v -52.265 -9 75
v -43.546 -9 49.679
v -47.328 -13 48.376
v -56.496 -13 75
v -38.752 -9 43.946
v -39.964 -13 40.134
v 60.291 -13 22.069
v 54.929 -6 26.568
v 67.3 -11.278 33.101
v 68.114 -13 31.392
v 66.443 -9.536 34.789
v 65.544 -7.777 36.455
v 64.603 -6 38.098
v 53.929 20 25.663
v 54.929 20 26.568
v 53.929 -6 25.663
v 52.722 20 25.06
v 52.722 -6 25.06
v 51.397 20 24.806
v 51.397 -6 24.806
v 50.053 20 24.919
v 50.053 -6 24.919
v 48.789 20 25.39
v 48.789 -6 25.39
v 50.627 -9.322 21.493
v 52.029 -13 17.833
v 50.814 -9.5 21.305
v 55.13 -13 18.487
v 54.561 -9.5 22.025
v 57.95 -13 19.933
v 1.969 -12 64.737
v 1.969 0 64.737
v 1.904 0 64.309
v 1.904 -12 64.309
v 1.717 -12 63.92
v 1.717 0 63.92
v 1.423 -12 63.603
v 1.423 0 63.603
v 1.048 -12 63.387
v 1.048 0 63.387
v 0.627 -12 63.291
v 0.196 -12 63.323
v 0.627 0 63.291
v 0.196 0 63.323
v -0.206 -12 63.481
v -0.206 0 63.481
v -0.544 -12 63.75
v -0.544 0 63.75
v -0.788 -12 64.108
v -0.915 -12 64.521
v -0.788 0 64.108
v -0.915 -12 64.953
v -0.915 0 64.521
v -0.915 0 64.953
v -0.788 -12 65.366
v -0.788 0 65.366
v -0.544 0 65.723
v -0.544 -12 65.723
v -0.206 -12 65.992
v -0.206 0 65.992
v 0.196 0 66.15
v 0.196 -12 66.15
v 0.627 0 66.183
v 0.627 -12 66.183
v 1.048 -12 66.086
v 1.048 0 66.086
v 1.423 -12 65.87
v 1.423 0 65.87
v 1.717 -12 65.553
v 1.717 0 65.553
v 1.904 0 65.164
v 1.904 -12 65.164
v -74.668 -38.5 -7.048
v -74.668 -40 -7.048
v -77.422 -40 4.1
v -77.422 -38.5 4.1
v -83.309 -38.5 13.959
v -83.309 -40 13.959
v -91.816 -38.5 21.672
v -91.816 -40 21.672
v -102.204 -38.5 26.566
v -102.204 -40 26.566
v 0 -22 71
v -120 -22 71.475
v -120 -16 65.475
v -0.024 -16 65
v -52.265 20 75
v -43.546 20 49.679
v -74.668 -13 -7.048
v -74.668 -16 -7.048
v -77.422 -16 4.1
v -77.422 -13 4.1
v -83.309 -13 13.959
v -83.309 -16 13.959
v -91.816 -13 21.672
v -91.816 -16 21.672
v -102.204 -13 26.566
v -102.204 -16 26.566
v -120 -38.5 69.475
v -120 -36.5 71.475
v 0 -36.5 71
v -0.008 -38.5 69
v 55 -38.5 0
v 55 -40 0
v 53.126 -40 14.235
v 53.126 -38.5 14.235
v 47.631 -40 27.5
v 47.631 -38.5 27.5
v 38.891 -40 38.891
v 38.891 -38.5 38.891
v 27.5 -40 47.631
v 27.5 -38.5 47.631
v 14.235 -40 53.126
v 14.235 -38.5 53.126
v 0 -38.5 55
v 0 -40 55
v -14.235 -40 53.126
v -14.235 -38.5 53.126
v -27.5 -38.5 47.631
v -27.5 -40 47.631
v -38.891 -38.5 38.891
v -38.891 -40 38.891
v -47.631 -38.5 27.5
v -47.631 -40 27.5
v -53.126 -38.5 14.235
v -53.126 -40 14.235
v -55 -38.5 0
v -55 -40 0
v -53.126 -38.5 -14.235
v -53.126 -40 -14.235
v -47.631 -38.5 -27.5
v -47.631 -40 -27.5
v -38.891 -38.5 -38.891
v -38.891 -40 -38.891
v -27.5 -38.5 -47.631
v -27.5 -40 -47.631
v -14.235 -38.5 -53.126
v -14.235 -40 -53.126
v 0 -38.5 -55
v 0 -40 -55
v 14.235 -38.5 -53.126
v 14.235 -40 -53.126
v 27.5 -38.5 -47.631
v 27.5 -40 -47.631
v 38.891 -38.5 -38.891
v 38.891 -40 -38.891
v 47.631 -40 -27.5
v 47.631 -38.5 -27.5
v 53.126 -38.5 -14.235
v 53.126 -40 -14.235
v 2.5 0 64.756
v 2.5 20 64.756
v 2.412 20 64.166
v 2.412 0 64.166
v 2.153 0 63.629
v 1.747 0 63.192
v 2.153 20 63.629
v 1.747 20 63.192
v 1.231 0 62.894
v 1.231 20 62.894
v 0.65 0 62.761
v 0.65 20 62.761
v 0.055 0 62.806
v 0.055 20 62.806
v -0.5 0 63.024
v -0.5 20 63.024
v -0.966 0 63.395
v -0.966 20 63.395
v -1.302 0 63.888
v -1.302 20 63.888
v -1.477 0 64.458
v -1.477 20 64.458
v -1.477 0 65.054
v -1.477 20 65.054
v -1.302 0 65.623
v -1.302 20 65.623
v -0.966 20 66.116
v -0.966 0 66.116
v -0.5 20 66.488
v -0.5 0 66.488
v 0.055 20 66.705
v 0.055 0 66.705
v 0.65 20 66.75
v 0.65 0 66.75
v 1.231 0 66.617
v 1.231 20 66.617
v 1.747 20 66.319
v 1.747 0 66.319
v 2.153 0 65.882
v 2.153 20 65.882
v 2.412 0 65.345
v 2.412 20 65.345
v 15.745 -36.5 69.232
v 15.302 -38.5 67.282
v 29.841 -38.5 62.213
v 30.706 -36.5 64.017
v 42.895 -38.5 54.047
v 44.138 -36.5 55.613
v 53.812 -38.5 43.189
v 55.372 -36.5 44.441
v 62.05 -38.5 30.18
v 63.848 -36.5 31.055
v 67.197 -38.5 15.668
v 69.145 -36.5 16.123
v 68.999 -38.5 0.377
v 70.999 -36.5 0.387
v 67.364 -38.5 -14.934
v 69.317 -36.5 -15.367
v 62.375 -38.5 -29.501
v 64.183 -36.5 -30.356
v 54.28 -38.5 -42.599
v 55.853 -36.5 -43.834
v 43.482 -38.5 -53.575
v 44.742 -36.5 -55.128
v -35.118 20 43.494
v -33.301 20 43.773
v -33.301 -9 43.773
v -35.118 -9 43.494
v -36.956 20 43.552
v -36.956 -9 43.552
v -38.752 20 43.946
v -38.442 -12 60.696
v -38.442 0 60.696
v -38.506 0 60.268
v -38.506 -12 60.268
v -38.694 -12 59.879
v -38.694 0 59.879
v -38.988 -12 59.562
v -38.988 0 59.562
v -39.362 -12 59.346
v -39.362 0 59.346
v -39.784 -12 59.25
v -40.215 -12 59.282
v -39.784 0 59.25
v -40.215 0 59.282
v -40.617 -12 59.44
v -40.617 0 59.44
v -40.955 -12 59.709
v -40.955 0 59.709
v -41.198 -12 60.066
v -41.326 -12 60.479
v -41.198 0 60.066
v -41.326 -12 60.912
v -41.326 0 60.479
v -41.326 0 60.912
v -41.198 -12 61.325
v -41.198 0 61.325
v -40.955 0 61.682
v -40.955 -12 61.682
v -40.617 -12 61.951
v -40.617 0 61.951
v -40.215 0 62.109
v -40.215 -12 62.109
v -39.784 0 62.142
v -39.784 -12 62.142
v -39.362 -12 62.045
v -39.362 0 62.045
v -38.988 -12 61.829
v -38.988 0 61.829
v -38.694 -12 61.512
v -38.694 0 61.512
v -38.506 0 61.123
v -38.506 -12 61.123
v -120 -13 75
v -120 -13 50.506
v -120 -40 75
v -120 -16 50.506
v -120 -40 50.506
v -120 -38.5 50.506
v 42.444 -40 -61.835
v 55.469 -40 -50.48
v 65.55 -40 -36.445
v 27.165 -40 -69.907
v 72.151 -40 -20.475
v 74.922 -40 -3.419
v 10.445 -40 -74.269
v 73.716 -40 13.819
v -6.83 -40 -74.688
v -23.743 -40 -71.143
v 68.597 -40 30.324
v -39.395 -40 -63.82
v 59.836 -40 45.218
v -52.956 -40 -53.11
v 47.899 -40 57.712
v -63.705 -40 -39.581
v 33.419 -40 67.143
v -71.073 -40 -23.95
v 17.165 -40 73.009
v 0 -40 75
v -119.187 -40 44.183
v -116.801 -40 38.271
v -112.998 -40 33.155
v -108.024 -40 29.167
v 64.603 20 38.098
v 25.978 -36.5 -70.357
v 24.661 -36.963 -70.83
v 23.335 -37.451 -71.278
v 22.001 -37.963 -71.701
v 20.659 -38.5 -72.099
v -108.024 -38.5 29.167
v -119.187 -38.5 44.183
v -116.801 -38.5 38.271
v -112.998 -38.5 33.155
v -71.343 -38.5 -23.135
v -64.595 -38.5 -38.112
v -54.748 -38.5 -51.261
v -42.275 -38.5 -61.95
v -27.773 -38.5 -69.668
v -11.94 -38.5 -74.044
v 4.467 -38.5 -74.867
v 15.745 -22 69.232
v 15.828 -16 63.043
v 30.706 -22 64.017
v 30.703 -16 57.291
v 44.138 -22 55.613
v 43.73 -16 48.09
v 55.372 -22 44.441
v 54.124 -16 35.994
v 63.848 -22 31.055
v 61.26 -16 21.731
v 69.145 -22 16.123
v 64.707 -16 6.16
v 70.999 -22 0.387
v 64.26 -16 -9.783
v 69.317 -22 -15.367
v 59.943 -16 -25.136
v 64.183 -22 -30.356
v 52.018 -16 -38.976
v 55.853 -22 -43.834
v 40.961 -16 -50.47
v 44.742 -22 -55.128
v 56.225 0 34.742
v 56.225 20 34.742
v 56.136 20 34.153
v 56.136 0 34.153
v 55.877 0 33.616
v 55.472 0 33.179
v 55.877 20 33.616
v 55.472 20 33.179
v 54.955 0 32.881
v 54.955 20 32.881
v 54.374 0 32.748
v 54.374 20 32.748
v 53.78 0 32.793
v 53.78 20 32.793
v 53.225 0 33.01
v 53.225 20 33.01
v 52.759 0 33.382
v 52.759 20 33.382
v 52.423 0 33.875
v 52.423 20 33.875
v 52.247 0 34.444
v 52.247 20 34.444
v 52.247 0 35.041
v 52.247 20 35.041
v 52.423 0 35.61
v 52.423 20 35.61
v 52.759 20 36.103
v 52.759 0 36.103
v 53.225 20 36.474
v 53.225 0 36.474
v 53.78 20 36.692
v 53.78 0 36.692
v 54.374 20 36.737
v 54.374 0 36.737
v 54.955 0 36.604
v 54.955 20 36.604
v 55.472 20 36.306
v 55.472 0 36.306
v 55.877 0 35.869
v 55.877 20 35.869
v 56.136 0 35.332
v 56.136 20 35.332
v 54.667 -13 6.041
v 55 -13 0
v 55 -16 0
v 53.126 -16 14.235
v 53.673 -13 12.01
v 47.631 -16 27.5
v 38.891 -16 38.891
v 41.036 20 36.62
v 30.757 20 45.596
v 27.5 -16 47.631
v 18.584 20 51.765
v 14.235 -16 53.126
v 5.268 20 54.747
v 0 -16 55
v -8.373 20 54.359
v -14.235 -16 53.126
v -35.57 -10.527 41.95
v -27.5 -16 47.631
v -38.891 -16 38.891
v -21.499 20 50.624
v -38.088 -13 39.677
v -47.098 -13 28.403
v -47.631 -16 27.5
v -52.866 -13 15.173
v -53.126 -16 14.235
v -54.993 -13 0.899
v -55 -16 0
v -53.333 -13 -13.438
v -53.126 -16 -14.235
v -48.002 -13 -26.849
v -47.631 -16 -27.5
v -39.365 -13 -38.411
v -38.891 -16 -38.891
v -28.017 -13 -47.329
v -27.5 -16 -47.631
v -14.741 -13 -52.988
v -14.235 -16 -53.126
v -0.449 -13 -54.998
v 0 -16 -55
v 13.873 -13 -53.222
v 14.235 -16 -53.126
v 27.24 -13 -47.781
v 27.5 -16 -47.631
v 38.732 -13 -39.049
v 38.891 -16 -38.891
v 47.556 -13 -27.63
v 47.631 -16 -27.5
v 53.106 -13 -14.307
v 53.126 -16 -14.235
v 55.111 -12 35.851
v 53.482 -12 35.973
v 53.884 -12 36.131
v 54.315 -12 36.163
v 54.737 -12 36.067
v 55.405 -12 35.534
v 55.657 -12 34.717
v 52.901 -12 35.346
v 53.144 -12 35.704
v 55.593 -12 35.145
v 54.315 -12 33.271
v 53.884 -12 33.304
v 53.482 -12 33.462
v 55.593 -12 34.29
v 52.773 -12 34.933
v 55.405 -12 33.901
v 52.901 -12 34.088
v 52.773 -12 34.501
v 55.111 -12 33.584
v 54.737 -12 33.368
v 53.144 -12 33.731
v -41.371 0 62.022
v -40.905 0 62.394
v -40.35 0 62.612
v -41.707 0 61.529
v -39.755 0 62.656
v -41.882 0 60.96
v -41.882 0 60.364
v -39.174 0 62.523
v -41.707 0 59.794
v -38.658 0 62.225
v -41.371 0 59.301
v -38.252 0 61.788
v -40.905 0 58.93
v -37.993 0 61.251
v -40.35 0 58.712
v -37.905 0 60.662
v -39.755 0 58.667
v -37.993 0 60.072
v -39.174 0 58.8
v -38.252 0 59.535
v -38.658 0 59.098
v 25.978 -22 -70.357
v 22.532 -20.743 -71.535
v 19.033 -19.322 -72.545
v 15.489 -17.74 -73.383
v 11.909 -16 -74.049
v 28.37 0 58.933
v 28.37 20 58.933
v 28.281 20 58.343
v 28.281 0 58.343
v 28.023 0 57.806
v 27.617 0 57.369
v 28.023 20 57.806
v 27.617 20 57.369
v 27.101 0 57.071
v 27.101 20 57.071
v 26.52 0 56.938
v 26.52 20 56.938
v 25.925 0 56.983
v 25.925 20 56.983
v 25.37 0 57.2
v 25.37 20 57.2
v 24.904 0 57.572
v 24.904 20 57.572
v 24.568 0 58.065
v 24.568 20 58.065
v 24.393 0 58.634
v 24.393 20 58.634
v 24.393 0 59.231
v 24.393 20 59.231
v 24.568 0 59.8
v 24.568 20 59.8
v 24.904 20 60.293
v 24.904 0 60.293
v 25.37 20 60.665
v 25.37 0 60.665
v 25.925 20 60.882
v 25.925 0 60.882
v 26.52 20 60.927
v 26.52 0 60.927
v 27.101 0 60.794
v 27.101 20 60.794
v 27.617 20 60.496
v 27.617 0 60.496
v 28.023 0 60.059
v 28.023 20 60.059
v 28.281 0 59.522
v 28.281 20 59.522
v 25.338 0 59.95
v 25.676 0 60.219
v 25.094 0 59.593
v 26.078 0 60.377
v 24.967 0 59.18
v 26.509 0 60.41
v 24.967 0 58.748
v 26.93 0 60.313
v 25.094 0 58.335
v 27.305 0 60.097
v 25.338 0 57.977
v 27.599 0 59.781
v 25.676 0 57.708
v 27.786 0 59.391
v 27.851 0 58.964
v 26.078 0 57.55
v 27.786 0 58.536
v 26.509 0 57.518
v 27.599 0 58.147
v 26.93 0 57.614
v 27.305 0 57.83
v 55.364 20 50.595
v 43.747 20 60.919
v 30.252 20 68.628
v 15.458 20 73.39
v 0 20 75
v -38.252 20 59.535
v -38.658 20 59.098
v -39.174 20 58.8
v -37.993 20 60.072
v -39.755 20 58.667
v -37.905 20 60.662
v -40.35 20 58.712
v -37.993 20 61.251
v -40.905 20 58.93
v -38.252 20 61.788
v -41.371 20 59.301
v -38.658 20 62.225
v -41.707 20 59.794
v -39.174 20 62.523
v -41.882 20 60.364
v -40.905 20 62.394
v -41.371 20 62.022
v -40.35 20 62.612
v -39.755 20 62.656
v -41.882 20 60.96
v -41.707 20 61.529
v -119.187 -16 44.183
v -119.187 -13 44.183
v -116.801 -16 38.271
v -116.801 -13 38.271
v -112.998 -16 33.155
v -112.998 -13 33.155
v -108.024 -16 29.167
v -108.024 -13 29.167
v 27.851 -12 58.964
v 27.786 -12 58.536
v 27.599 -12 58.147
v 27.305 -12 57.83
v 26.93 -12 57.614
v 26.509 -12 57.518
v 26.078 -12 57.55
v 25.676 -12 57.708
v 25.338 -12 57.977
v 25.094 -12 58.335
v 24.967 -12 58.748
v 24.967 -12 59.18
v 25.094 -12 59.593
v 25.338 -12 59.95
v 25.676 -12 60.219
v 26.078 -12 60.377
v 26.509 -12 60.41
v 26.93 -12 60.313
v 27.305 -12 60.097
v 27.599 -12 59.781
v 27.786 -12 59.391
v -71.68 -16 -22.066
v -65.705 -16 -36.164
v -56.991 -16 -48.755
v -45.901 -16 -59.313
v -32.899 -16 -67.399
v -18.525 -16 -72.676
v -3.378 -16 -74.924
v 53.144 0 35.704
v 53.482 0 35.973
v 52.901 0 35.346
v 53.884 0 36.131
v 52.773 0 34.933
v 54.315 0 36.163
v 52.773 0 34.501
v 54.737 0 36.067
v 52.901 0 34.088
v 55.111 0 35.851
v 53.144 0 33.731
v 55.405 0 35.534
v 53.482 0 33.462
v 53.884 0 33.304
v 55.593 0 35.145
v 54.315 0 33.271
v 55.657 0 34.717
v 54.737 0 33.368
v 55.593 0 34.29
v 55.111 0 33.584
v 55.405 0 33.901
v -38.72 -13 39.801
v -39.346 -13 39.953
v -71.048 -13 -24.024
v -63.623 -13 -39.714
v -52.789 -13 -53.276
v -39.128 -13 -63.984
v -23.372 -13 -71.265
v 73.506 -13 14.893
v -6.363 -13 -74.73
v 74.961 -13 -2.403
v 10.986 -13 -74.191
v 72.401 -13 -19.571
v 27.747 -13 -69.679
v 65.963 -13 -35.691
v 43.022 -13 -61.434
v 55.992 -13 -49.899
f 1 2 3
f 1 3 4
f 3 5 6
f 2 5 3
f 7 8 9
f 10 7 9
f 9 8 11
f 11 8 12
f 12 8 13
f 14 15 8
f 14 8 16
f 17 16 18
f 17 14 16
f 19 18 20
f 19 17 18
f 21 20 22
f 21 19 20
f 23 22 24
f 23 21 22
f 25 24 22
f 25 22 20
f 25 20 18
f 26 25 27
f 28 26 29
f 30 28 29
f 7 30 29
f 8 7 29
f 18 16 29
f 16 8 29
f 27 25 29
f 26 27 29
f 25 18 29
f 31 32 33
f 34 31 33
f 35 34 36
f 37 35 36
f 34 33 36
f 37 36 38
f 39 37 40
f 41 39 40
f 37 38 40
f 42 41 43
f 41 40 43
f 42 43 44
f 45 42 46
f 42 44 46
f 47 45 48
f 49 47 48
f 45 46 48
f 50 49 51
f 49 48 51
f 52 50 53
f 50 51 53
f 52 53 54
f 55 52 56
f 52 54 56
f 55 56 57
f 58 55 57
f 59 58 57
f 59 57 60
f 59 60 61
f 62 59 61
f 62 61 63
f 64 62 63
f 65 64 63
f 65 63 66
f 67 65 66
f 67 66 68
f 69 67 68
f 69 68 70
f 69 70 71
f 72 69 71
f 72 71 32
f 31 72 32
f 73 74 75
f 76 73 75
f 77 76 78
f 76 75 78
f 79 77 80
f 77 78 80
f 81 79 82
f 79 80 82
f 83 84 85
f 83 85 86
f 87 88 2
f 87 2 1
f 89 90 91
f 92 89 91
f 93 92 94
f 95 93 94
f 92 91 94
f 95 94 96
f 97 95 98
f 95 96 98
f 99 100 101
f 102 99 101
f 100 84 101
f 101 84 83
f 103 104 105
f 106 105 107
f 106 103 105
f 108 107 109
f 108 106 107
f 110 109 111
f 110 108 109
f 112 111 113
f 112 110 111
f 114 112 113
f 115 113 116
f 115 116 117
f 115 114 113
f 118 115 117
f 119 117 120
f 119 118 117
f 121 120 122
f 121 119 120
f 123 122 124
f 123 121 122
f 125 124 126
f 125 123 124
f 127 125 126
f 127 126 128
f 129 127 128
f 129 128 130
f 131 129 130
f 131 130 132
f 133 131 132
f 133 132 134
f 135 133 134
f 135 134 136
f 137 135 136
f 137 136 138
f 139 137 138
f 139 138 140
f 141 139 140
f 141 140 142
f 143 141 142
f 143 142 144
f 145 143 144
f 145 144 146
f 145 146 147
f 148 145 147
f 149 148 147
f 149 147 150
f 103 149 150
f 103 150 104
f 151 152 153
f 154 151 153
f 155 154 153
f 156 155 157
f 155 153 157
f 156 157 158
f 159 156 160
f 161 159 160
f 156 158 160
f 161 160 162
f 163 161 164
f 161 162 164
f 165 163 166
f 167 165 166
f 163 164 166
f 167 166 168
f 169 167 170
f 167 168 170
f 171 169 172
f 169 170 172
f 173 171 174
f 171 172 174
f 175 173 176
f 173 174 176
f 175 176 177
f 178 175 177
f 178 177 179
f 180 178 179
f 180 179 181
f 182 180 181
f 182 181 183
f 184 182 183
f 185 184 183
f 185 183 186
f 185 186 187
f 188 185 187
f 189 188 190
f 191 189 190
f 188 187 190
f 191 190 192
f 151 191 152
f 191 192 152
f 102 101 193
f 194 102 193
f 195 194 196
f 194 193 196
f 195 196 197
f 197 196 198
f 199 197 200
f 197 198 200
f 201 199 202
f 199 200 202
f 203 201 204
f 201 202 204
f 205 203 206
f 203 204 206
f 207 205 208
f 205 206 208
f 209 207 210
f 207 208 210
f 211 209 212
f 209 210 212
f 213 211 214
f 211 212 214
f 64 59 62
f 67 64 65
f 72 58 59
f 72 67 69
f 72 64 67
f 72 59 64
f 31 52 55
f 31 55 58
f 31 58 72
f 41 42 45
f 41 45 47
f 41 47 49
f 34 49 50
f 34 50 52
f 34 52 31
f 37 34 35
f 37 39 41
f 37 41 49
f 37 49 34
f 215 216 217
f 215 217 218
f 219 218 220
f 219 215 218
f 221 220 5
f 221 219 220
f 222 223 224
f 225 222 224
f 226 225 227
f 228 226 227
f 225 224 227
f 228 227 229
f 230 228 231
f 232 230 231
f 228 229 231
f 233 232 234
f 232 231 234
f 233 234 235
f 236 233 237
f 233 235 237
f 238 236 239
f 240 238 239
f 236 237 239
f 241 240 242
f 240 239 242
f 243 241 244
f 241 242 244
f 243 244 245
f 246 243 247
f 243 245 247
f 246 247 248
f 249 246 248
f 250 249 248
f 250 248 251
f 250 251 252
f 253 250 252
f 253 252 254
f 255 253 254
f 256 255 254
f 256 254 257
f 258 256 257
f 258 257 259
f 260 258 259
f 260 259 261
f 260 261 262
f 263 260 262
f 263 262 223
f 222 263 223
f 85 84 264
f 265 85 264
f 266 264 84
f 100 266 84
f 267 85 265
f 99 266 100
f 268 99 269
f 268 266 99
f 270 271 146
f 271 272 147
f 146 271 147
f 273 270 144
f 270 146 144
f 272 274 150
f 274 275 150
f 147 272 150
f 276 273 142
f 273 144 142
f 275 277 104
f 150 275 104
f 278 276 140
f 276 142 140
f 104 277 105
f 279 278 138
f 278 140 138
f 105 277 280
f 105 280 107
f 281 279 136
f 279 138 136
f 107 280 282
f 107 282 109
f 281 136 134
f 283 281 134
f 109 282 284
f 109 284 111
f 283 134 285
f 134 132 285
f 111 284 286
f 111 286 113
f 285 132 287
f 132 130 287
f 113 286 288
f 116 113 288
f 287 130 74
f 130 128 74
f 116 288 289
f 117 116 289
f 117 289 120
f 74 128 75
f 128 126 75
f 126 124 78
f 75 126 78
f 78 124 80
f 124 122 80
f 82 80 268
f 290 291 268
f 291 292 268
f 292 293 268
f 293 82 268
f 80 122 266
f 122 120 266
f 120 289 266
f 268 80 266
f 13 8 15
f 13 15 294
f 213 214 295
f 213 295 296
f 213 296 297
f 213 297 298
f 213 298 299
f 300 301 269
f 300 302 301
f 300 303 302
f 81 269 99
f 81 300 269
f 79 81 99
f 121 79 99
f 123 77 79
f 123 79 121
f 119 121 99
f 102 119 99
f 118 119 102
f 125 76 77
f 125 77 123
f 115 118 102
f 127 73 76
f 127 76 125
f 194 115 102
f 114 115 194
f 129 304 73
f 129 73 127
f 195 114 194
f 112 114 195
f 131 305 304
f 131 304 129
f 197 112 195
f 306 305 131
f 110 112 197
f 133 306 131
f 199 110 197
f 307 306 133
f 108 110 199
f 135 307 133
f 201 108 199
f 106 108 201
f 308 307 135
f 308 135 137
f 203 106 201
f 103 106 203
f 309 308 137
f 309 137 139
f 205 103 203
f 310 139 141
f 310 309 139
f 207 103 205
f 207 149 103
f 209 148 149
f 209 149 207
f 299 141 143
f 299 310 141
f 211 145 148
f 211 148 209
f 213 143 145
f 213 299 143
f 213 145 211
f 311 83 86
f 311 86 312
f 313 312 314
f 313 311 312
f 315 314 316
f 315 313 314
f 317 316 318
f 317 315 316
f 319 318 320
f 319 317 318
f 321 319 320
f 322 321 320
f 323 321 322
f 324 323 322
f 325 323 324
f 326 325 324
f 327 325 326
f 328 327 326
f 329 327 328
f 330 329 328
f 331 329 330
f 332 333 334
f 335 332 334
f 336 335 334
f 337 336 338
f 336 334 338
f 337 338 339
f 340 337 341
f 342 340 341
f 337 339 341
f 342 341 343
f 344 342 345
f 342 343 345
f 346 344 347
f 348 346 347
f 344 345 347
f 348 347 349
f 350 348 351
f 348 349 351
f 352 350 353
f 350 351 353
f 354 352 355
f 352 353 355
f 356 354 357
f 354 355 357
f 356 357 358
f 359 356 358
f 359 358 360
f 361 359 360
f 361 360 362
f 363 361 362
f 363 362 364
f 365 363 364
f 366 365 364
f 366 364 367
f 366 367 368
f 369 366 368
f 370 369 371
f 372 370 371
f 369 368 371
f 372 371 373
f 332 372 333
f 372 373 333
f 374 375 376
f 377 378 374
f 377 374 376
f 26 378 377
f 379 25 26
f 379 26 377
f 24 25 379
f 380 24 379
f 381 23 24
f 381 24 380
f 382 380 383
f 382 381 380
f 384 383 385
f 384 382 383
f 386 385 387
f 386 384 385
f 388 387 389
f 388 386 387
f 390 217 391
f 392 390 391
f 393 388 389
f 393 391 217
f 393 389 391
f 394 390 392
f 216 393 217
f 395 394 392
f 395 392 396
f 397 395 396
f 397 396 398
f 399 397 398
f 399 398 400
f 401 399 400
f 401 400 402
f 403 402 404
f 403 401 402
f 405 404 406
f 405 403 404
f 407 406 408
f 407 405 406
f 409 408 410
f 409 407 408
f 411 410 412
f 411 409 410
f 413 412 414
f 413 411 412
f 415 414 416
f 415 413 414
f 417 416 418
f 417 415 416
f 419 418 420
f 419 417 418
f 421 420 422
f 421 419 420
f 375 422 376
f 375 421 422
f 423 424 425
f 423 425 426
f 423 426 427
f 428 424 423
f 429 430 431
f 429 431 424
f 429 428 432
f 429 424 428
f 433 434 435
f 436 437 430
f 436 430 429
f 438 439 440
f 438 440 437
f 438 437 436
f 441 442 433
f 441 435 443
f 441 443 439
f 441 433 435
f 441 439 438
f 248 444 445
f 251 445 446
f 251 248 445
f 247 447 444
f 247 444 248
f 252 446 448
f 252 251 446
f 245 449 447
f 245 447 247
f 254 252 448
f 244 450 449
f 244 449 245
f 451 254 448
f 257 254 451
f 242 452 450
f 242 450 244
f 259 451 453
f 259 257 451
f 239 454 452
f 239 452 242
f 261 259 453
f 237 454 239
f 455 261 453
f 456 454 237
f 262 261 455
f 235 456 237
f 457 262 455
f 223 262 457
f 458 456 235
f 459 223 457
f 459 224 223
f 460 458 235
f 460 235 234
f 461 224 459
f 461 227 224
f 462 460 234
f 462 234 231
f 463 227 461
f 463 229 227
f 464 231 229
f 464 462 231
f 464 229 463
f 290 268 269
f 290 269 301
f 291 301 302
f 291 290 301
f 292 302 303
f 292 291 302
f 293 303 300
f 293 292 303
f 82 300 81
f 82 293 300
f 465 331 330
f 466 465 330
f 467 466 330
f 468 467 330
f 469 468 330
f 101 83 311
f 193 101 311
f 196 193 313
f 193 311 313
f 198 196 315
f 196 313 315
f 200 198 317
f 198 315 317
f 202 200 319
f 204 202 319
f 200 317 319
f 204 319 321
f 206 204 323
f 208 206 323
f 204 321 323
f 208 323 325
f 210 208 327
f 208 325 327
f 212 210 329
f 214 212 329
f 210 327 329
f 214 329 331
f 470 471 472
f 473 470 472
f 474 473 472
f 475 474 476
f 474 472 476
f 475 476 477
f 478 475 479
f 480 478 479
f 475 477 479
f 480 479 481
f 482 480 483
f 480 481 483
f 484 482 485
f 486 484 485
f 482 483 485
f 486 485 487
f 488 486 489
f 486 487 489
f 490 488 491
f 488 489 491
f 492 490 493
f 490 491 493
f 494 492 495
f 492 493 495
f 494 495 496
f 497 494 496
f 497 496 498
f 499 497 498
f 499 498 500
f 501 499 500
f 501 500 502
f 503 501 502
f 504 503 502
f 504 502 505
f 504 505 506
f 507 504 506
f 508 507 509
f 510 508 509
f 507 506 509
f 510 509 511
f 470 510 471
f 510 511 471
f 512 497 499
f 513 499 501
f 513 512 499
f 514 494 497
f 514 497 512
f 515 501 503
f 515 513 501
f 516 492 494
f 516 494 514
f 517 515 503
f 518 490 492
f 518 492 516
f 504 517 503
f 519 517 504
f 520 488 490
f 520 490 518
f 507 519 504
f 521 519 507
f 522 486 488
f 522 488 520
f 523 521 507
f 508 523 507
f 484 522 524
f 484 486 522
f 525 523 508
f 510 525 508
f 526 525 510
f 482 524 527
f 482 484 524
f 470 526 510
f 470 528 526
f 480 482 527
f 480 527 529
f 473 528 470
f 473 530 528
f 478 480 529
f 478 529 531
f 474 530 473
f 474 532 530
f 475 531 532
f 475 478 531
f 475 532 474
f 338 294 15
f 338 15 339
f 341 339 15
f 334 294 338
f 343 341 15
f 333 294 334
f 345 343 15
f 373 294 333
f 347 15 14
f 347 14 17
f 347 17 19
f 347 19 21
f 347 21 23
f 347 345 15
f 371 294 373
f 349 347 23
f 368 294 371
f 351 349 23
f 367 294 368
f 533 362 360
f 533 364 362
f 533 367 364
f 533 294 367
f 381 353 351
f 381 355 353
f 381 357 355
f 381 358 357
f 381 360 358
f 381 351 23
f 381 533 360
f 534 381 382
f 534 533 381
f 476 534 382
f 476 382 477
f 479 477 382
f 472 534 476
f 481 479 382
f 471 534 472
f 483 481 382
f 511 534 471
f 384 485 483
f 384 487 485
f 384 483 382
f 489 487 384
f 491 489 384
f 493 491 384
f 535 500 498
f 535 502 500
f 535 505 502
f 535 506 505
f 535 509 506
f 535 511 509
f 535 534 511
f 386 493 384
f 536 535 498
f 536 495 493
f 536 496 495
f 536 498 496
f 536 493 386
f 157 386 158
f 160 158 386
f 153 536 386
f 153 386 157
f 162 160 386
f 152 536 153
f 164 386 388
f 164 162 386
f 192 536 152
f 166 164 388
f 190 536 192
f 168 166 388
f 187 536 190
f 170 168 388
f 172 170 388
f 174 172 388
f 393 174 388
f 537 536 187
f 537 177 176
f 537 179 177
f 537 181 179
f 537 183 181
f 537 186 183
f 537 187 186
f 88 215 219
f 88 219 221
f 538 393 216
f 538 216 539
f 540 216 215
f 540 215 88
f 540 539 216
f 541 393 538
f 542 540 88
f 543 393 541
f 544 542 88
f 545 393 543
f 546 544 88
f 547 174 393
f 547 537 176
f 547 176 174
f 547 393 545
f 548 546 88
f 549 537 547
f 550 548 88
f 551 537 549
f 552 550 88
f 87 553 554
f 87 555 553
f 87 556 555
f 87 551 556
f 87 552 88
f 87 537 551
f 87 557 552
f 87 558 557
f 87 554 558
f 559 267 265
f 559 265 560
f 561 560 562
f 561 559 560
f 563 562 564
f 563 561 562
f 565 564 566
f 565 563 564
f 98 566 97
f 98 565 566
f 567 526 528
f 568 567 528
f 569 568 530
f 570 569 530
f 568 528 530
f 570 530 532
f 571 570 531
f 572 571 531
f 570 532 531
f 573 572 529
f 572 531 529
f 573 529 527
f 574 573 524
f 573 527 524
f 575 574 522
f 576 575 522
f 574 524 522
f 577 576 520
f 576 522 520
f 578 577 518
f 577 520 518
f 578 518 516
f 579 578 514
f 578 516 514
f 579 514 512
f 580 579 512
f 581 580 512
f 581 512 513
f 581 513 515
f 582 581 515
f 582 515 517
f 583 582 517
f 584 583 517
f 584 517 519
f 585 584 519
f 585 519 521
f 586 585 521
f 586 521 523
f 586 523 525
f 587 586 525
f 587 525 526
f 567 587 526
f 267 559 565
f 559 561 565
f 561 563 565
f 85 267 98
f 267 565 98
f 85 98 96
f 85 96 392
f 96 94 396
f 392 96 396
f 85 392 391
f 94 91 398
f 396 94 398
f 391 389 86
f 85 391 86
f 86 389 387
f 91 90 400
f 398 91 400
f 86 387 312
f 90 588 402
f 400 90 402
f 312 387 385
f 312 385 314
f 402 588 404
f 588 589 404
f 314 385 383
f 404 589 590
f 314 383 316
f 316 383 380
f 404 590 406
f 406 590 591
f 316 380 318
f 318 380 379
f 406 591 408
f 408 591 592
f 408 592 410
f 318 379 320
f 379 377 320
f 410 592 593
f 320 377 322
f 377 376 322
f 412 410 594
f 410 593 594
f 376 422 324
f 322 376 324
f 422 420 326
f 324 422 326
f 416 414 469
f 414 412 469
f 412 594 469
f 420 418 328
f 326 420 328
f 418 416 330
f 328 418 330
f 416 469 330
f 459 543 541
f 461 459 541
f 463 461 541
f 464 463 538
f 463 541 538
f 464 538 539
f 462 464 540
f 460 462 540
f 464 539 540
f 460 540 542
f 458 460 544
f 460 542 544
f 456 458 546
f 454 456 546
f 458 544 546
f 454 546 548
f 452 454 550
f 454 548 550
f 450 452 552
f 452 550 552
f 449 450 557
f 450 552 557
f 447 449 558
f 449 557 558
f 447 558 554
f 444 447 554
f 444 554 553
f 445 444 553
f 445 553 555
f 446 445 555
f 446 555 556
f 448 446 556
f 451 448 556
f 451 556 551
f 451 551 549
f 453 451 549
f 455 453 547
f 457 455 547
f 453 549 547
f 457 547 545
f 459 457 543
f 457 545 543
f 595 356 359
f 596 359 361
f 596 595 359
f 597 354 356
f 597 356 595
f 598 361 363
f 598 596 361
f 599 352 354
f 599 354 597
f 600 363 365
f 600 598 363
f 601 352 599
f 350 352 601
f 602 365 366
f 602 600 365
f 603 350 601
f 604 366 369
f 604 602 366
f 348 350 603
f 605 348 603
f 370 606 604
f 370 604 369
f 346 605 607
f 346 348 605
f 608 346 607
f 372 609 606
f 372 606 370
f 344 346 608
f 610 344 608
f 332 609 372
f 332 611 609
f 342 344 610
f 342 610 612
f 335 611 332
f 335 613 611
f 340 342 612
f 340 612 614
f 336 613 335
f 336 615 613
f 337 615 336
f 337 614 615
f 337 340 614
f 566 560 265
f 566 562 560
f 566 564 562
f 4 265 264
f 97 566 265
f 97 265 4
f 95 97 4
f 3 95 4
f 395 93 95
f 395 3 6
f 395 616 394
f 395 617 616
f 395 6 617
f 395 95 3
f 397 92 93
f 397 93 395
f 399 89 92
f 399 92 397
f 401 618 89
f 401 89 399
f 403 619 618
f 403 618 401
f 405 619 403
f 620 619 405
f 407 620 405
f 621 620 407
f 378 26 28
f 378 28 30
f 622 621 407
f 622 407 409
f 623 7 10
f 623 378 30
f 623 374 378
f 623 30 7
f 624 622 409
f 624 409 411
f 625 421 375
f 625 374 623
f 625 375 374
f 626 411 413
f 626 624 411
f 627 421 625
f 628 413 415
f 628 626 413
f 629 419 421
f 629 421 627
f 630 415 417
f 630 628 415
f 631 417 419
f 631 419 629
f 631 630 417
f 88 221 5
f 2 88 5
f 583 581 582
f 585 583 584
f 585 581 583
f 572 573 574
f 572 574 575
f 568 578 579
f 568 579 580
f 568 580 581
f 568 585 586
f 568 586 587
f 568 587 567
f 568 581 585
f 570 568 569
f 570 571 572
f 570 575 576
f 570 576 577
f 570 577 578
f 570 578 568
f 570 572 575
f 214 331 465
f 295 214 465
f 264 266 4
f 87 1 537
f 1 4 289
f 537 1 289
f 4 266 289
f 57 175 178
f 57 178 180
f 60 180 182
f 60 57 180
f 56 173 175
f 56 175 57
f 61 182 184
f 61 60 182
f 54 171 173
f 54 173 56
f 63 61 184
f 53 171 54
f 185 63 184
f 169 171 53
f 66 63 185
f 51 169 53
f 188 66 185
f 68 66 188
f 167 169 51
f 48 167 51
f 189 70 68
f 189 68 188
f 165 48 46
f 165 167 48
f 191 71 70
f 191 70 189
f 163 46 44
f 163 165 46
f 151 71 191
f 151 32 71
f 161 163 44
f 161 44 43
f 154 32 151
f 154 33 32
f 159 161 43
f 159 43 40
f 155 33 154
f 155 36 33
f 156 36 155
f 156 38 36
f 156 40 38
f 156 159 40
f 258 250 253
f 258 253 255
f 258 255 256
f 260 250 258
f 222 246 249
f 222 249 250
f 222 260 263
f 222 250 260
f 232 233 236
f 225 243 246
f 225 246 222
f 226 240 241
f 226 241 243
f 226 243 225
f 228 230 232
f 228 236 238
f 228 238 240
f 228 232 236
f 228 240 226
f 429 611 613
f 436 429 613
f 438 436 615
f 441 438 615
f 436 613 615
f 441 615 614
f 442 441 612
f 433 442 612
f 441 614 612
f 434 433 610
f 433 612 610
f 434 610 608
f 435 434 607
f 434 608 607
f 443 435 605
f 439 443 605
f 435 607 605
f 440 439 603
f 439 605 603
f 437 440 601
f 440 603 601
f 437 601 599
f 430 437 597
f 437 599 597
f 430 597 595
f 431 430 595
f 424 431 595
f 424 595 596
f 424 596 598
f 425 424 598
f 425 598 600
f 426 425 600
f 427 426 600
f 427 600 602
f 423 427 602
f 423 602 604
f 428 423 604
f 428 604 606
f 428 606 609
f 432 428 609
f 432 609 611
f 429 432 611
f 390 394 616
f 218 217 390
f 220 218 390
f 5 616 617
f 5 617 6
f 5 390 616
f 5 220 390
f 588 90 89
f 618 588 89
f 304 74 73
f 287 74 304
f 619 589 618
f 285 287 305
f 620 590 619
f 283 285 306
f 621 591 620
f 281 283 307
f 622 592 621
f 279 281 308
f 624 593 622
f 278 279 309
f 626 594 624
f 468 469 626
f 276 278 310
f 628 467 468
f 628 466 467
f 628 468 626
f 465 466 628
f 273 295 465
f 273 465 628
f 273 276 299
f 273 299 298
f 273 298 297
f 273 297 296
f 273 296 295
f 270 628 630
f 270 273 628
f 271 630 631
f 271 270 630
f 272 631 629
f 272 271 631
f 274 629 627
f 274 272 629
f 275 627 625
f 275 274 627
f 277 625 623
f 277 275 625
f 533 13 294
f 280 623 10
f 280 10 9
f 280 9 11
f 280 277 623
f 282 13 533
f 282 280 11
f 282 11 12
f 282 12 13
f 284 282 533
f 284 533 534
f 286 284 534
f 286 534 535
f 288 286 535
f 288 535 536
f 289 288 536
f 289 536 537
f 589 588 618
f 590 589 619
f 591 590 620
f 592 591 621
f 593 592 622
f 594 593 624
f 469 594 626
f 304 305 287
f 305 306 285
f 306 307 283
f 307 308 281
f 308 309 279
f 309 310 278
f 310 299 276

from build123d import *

# Parameters (mm, degrees)
SKETCH_R        = 55
PAD_DEPTH       = 40
PAD_DEPTH_BACK  = 20
POCKET_DEPTH    = 33
POCKET001_START = -3
POCKET001_DEPTH = 22.5
CHAMFER_SIZE    = 7
CHAMFER001_SIZE = 4
CHAMFER002_SIZE = 6
CHAMFER003_SIZE = 2
SKETCH006_R     = 1.45
POCKET002_DEPTH = 32
SKETCH007_R     = 2
POCKET003_DEPTH = 20


with BuildPart() as part:
    # Sketch → Pad (new body, two sides)
    with BuildSketch(Plane.XZ) as pad_sk:
        with BuildLine():
            Line((-120, 75), (0, 75))
            ThreePointArc((-74.66808, -7.048245), (55.468993, -50.479608), (0, 75))
            ThreePointArc((-74.66808, -7.048245), (-83.30852, 13.959176), (-102.203647, 26.566441))
            ThreePointArc((-120, 50.506104), (-115.063539, 35.591198), (-102.203647, 26.566441))
            Line((-120, 75), (-120, 50.506104))
        make_face()
        Circle(SKETCH_R, mode=Mode.SUBTRACT)
    extrude(amount=PAD_DEPTH)
    extrude(pad_sk.sketch, amount=-PAD_DEPTH_BACK)

    # Sketch001 (on Face7 of Pad) → Pocket (cut)
    with BuildSketch(Plane(origin=(0, 20, 0), x_dir=(1, 0, 0), z_dir=(0, 1, 0))):
        with BuildLine():
            Line((54.928753, -26.568443), (75.942328, -51.611447))
            ThreePointArc((75.942328, -51.611447), (26.999321, 87.761127), (-91.820361, 0))
            Line((-211.758942, -107.924309), (-91.820361, 0))
            Line((-30.973335, -107.924309), (-211.758942, -107.924309))
            Line((-16.47613, -75.395136), (-30.973335, -107.924309))
            Line((-52.401144, -75.395136), (-16.47613, -75.395136))
            Line((-42.243927, -45.896434), (-52.401144, -75.395136))
            ThreePointArc((-31.672581, -44.331432), (-37.184839, -43.583386), (-42.243927, -45.896434))
            Line((43.621241, -30.505082), (-31.672581, -44.331432))
            Line((47.528801, -26.356267), (43.621241, -30.505082))
            ThreePointArc((54.928753, -26.568443), (51.276407, -24.801164), (47.528801, -26.356267))
        make_face()
    extrude(amount=-POCKET_DEPTH, mode=Mode.SUBTRACT)

    # Sketch003 (on Face2 of Pocket) → Pocket001 (cut)
    with BuildSketch(Plane(origin=(0, -13, 0), x_dir=(1, 0, 0), z_dir=(0, 1, 0)).offset(POCKET001_START)):
        with BuildLine():
            ThreePointArc((0, -71), (66.914561, -23.736924), (44.742136, 55.128407))
            Line((44.742136, 55.128407), (-20.564905, 108.131508))
            Line((-20.564905, 108.131508), (-158.301559, 56.449516))
            Line((-158.301559, 56.449516), (-204.416763, -71.809135))
            Line((-204.416763, -71.809135), (0, -71))
        make_face()
    extrude(amount=-POCKET001_DEPTH, mode=Mode.SUBTRACT)

    # Chamfer
    chamfer_edges = [part.edges().sort_by_distance(p)[0] for p in [
        (59.765906, -13, 32.333137),
    ]]
    chamfer(chamfer_edges, length=CHAMFER_SIZE)

    # Chamfer001
    chamfer001_edges = [part.edges().sort_by_distance(p)[0] for p in [
        (-42.243927, 3.5, 45.896434),
        (-38.03091, -13, 43.746161),
        (-47.254507, -13, 60.448217),
    ]]
    chamfer(chamfer001_edges, length=CHAMFER001_SIZE)

    # Chamfer002
    chamfer002_edges = [part.edges().sort_by_distance(p)[0] for p in [
        (66.914561, -16, 23.736924),
    ]]
    chamfer(chamfer002_edges, length=CHAMFER002_SIZE)

    # Chamfer003
    chamfer003_edges = [part.edges().sort_by_distance(p)[0] for p in [
        (-60, -38.5, 71.237496),
    ]]
    chamfer(chamfer003_edges, length=CHAMFER003_SIZE)

    # Sketch006 → Pocket002 (cut)
    with BuildSketch(Plane(origin=(0, 20, 0), x_dir=(1, 0, 0), z_dir=(0, 1, 0))):
        with Locations((-39.891945, -60.695583)):
            Circle(SKETCH006_R)
        with Locations((0.518637, -64.736641)):
            Circle(SKETCH006_R)
        with Locations((26.400654, -58.963699)):
            Circle(SKETCH006_R)
        with Locations((54.206989, -34.71735)):
            Circle(SKETCH006_R)
    extrude(amount=-POCKET002_DEPTH, mode=Mode.SUBTRACT)

    # Sketch007 → Pocket003 (cut)
    with BuildSketch(Plane(origin=(0, 20, 0), x_dir=(1, 0, 0), z_dir=(0, 1, 0))):
        with Locations((-39.904575, -60.661716)):
            Circle(SKETCH007_R)
        with Locations((0.50043, -64.755608)):
            Circle(SKETCH007_R)
        with Locations((26.37031, -58.932541)):
            Circle(SKETCH007_R)
        with Locations((54.224796, -34.742435)):
            Circle(SKETCH007_R)
    extrude(amount=-POCKET003_DEPTH, mode=Mode.SUBTRACT)


solid = part.part
